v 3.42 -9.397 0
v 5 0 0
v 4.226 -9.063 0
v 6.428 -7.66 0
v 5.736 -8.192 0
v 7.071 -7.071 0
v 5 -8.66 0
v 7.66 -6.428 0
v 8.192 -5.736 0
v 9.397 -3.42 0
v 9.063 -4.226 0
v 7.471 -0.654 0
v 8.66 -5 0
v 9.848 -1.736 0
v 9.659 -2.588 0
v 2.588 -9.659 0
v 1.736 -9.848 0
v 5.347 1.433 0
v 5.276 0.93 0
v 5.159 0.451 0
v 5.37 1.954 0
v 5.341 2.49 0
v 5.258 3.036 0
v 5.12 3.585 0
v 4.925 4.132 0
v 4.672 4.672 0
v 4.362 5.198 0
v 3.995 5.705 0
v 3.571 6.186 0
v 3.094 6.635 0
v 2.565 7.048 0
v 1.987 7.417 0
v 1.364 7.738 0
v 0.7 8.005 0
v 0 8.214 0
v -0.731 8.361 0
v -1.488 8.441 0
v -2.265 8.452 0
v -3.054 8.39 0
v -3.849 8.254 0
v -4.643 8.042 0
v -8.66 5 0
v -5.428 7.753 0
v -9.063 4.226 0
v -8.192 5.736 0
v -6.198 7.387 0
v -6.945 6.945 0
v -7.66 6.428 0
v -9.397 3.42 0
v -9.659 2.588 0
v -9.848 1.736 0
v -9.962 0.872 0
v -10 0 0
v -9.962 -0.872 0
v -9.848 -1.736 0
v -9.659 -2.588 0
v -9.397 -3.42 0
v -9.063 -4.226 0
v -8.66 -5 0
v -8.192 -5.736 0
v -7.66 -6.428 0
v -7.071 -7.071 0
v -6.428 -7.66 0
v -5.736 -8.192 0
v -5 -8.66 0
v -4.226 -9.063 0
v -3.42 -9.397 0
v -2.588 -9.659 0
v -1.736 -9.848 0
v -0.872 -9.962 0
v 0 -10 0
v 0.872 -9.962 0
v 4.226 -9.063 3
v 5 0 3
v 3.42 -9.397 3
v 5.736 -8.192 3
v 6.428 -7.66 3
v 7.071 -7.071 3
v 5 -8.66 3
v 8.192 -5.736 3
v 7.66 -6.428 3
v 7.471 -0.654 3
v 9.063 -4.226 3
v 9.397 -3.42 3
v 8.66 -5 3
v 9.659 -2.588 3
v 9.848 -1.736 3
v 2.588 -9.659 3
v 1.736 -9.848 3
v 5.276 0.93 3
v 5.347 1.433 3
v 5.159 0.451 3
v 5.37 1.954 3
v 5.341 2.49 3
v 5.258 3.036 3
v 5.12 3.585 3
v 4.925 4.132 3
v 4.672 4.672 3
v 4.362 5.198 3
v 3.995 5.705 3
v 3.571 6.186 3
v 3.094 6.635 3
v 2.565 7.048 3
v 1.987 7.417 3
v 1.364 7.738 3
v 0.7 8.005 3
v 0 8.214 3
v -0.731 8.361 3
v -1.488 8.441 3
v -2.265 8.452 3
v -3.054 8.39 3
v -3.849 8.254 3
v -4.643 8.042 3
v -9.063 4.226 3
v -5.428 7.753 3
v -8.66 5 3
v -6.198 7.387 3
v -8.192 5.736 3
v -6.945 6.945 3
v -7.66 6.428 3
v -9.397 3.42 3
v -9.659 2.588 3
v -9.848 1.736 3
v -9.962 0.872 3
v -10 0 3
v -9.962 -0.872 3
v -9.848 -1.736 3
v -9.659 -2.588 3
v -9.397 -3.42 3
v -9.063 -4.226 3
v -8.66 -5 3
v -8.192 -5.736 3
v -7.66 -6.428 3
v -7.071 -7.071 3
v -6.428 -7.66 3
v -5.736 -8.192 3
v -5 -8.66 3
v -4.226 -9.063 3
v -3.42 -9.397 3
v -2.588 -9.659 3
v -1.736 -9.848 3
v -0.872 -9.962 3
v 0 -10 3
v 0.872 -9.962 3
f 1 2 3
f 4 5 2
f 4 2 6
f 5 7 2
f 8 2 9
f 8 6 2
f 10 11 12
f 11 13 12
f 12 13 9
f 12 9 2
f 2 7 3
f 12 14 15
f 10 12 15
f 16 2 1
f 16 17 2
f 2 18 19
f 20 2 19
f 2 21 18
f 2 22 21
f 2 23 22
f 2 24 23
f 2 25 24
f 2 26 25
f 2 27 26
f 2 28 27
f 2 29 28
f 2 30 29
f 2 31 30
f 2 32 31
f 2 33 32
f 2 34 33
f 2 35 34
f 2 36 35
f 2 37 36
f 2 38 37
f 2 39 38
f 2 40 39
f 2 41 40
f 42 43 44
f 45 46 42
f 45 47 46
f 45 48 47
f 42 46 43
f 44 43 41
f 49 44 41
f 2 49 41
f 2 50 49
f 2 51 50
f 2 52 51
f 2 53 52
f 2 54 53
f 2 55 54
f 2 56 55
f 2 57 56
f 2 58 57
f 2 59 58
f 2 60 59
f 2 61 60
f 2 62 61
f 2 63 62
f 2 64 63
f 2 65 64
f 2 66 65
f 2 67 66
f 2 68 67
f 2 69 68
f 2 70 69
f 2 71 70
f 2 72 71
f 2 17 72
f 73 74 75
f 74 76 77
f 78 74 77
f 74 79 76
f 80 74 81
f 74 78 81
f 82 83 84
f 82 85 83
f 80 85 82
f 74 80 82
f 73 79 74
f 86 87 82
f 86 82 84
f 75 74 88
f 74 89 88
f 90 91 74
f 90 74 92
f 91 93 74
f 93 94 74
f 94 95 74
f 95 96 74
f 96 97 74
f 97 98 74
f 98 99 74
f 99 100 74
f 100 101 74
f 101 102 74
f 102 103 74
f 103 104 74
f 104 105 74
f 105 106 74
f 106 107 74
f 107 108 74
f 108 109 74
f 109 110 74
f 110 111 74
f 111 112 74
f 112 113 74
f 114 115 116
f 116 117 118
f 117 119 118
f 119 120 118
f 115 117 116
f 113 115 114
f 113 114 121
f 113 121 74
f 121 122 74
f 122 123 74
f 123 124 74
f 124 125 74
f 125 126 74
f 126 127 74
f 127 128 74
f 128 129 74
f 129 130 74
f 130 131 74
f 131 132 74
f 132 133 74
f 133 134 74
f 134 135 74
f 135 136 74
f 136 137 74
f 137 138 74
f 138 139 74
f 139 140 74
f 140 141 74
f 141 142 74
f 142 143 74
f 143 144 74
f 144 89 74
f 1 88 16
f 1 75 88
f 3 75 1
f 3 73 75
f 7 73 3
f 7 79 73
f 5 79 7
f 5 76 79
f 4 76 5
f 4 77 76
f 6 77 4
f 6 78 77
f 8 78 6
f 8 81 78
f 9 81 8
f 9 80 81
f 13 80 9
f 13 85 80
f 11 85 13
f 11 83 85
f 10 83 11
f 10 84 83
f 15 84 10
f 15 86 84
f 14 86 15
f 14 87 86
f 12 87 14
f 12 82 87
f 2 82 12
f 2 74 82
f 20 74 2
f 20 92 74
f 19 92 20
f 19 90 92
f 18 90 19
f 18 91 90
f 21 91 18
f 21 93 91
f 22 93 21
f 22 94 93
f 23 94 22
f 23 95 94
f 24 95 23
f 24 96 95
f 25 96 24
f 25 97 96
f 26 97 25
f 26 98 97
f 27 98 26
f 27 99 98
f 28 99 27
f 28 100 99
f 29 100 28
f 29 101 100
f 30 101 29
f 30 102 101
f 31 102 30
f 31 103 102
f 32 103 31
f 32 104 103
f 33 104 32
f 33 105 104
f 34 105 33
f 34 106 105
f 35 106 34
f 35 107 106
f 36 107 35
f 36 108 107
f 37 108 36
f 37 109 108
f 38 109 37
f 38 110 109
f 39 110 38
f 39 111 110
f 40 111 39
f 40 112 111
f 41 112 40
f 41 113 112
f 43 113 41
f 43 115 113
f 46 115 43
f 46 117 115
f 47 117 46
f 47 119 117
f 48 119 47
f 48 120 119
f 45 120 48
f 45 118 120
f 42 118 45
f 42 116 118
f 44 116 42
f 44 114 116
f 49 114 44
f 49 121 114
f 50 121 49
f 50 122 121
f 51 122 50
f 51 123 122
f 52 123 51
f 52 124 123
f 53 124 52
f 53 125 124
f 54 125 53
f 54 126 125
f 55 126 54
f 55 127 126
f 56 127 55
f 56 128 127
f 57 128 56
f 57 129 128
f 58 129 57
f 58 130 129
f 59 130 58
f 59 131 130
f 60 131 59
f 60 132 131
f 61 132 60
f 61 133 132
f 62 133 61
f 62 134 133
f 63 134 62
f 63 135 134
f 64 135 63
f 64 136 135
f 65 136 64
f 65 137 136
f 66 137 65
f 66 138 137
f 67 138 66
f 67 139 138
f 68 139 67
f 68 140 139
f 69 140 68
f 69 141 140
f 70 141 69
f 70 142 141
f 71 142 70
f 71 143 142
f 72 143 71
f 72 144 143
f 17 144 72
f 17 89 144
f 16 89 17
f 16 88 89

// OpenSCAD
function polar_to_xy(v) = [v[1] * cos(v[0]), v[1] * sin(v[0] )];
//function polar_to_xy(v) = v;

module polar_profile(control_points,step) {
/*
    control_points is an array of arrays, each of which defines a 
    point in polar cordinates [angle, radius] 
    the last angle must be the first angle + 360 for a complete profile
      e.g. [ [0,5], [130,9.9], [140,10], [350,10], [360,5] ]
    the result is a 2D profile interpolated at step degree intervals
    between these points
    by kit.wallace@gmail.com
*/
    for (angle =[0: step: 360 - 1])
    {
       ps = [angle,  lookup(angle, control_points)];
       pe = [angle+step,  lookup(angle+step, control_points) ];
       polygon ([ [0,0], polar_to_xy(ps), polar_to_xy(pe)]);
    }
}

snail = [ [0,5], [140,10], [350,10], [360,5] ];
//snail = [ [0,5], [360,10] ];
linear_extrude(height = 3)
  polar_profile(snail,5);

//polygon ([ [0,0], [10,10], [0,10]]);
